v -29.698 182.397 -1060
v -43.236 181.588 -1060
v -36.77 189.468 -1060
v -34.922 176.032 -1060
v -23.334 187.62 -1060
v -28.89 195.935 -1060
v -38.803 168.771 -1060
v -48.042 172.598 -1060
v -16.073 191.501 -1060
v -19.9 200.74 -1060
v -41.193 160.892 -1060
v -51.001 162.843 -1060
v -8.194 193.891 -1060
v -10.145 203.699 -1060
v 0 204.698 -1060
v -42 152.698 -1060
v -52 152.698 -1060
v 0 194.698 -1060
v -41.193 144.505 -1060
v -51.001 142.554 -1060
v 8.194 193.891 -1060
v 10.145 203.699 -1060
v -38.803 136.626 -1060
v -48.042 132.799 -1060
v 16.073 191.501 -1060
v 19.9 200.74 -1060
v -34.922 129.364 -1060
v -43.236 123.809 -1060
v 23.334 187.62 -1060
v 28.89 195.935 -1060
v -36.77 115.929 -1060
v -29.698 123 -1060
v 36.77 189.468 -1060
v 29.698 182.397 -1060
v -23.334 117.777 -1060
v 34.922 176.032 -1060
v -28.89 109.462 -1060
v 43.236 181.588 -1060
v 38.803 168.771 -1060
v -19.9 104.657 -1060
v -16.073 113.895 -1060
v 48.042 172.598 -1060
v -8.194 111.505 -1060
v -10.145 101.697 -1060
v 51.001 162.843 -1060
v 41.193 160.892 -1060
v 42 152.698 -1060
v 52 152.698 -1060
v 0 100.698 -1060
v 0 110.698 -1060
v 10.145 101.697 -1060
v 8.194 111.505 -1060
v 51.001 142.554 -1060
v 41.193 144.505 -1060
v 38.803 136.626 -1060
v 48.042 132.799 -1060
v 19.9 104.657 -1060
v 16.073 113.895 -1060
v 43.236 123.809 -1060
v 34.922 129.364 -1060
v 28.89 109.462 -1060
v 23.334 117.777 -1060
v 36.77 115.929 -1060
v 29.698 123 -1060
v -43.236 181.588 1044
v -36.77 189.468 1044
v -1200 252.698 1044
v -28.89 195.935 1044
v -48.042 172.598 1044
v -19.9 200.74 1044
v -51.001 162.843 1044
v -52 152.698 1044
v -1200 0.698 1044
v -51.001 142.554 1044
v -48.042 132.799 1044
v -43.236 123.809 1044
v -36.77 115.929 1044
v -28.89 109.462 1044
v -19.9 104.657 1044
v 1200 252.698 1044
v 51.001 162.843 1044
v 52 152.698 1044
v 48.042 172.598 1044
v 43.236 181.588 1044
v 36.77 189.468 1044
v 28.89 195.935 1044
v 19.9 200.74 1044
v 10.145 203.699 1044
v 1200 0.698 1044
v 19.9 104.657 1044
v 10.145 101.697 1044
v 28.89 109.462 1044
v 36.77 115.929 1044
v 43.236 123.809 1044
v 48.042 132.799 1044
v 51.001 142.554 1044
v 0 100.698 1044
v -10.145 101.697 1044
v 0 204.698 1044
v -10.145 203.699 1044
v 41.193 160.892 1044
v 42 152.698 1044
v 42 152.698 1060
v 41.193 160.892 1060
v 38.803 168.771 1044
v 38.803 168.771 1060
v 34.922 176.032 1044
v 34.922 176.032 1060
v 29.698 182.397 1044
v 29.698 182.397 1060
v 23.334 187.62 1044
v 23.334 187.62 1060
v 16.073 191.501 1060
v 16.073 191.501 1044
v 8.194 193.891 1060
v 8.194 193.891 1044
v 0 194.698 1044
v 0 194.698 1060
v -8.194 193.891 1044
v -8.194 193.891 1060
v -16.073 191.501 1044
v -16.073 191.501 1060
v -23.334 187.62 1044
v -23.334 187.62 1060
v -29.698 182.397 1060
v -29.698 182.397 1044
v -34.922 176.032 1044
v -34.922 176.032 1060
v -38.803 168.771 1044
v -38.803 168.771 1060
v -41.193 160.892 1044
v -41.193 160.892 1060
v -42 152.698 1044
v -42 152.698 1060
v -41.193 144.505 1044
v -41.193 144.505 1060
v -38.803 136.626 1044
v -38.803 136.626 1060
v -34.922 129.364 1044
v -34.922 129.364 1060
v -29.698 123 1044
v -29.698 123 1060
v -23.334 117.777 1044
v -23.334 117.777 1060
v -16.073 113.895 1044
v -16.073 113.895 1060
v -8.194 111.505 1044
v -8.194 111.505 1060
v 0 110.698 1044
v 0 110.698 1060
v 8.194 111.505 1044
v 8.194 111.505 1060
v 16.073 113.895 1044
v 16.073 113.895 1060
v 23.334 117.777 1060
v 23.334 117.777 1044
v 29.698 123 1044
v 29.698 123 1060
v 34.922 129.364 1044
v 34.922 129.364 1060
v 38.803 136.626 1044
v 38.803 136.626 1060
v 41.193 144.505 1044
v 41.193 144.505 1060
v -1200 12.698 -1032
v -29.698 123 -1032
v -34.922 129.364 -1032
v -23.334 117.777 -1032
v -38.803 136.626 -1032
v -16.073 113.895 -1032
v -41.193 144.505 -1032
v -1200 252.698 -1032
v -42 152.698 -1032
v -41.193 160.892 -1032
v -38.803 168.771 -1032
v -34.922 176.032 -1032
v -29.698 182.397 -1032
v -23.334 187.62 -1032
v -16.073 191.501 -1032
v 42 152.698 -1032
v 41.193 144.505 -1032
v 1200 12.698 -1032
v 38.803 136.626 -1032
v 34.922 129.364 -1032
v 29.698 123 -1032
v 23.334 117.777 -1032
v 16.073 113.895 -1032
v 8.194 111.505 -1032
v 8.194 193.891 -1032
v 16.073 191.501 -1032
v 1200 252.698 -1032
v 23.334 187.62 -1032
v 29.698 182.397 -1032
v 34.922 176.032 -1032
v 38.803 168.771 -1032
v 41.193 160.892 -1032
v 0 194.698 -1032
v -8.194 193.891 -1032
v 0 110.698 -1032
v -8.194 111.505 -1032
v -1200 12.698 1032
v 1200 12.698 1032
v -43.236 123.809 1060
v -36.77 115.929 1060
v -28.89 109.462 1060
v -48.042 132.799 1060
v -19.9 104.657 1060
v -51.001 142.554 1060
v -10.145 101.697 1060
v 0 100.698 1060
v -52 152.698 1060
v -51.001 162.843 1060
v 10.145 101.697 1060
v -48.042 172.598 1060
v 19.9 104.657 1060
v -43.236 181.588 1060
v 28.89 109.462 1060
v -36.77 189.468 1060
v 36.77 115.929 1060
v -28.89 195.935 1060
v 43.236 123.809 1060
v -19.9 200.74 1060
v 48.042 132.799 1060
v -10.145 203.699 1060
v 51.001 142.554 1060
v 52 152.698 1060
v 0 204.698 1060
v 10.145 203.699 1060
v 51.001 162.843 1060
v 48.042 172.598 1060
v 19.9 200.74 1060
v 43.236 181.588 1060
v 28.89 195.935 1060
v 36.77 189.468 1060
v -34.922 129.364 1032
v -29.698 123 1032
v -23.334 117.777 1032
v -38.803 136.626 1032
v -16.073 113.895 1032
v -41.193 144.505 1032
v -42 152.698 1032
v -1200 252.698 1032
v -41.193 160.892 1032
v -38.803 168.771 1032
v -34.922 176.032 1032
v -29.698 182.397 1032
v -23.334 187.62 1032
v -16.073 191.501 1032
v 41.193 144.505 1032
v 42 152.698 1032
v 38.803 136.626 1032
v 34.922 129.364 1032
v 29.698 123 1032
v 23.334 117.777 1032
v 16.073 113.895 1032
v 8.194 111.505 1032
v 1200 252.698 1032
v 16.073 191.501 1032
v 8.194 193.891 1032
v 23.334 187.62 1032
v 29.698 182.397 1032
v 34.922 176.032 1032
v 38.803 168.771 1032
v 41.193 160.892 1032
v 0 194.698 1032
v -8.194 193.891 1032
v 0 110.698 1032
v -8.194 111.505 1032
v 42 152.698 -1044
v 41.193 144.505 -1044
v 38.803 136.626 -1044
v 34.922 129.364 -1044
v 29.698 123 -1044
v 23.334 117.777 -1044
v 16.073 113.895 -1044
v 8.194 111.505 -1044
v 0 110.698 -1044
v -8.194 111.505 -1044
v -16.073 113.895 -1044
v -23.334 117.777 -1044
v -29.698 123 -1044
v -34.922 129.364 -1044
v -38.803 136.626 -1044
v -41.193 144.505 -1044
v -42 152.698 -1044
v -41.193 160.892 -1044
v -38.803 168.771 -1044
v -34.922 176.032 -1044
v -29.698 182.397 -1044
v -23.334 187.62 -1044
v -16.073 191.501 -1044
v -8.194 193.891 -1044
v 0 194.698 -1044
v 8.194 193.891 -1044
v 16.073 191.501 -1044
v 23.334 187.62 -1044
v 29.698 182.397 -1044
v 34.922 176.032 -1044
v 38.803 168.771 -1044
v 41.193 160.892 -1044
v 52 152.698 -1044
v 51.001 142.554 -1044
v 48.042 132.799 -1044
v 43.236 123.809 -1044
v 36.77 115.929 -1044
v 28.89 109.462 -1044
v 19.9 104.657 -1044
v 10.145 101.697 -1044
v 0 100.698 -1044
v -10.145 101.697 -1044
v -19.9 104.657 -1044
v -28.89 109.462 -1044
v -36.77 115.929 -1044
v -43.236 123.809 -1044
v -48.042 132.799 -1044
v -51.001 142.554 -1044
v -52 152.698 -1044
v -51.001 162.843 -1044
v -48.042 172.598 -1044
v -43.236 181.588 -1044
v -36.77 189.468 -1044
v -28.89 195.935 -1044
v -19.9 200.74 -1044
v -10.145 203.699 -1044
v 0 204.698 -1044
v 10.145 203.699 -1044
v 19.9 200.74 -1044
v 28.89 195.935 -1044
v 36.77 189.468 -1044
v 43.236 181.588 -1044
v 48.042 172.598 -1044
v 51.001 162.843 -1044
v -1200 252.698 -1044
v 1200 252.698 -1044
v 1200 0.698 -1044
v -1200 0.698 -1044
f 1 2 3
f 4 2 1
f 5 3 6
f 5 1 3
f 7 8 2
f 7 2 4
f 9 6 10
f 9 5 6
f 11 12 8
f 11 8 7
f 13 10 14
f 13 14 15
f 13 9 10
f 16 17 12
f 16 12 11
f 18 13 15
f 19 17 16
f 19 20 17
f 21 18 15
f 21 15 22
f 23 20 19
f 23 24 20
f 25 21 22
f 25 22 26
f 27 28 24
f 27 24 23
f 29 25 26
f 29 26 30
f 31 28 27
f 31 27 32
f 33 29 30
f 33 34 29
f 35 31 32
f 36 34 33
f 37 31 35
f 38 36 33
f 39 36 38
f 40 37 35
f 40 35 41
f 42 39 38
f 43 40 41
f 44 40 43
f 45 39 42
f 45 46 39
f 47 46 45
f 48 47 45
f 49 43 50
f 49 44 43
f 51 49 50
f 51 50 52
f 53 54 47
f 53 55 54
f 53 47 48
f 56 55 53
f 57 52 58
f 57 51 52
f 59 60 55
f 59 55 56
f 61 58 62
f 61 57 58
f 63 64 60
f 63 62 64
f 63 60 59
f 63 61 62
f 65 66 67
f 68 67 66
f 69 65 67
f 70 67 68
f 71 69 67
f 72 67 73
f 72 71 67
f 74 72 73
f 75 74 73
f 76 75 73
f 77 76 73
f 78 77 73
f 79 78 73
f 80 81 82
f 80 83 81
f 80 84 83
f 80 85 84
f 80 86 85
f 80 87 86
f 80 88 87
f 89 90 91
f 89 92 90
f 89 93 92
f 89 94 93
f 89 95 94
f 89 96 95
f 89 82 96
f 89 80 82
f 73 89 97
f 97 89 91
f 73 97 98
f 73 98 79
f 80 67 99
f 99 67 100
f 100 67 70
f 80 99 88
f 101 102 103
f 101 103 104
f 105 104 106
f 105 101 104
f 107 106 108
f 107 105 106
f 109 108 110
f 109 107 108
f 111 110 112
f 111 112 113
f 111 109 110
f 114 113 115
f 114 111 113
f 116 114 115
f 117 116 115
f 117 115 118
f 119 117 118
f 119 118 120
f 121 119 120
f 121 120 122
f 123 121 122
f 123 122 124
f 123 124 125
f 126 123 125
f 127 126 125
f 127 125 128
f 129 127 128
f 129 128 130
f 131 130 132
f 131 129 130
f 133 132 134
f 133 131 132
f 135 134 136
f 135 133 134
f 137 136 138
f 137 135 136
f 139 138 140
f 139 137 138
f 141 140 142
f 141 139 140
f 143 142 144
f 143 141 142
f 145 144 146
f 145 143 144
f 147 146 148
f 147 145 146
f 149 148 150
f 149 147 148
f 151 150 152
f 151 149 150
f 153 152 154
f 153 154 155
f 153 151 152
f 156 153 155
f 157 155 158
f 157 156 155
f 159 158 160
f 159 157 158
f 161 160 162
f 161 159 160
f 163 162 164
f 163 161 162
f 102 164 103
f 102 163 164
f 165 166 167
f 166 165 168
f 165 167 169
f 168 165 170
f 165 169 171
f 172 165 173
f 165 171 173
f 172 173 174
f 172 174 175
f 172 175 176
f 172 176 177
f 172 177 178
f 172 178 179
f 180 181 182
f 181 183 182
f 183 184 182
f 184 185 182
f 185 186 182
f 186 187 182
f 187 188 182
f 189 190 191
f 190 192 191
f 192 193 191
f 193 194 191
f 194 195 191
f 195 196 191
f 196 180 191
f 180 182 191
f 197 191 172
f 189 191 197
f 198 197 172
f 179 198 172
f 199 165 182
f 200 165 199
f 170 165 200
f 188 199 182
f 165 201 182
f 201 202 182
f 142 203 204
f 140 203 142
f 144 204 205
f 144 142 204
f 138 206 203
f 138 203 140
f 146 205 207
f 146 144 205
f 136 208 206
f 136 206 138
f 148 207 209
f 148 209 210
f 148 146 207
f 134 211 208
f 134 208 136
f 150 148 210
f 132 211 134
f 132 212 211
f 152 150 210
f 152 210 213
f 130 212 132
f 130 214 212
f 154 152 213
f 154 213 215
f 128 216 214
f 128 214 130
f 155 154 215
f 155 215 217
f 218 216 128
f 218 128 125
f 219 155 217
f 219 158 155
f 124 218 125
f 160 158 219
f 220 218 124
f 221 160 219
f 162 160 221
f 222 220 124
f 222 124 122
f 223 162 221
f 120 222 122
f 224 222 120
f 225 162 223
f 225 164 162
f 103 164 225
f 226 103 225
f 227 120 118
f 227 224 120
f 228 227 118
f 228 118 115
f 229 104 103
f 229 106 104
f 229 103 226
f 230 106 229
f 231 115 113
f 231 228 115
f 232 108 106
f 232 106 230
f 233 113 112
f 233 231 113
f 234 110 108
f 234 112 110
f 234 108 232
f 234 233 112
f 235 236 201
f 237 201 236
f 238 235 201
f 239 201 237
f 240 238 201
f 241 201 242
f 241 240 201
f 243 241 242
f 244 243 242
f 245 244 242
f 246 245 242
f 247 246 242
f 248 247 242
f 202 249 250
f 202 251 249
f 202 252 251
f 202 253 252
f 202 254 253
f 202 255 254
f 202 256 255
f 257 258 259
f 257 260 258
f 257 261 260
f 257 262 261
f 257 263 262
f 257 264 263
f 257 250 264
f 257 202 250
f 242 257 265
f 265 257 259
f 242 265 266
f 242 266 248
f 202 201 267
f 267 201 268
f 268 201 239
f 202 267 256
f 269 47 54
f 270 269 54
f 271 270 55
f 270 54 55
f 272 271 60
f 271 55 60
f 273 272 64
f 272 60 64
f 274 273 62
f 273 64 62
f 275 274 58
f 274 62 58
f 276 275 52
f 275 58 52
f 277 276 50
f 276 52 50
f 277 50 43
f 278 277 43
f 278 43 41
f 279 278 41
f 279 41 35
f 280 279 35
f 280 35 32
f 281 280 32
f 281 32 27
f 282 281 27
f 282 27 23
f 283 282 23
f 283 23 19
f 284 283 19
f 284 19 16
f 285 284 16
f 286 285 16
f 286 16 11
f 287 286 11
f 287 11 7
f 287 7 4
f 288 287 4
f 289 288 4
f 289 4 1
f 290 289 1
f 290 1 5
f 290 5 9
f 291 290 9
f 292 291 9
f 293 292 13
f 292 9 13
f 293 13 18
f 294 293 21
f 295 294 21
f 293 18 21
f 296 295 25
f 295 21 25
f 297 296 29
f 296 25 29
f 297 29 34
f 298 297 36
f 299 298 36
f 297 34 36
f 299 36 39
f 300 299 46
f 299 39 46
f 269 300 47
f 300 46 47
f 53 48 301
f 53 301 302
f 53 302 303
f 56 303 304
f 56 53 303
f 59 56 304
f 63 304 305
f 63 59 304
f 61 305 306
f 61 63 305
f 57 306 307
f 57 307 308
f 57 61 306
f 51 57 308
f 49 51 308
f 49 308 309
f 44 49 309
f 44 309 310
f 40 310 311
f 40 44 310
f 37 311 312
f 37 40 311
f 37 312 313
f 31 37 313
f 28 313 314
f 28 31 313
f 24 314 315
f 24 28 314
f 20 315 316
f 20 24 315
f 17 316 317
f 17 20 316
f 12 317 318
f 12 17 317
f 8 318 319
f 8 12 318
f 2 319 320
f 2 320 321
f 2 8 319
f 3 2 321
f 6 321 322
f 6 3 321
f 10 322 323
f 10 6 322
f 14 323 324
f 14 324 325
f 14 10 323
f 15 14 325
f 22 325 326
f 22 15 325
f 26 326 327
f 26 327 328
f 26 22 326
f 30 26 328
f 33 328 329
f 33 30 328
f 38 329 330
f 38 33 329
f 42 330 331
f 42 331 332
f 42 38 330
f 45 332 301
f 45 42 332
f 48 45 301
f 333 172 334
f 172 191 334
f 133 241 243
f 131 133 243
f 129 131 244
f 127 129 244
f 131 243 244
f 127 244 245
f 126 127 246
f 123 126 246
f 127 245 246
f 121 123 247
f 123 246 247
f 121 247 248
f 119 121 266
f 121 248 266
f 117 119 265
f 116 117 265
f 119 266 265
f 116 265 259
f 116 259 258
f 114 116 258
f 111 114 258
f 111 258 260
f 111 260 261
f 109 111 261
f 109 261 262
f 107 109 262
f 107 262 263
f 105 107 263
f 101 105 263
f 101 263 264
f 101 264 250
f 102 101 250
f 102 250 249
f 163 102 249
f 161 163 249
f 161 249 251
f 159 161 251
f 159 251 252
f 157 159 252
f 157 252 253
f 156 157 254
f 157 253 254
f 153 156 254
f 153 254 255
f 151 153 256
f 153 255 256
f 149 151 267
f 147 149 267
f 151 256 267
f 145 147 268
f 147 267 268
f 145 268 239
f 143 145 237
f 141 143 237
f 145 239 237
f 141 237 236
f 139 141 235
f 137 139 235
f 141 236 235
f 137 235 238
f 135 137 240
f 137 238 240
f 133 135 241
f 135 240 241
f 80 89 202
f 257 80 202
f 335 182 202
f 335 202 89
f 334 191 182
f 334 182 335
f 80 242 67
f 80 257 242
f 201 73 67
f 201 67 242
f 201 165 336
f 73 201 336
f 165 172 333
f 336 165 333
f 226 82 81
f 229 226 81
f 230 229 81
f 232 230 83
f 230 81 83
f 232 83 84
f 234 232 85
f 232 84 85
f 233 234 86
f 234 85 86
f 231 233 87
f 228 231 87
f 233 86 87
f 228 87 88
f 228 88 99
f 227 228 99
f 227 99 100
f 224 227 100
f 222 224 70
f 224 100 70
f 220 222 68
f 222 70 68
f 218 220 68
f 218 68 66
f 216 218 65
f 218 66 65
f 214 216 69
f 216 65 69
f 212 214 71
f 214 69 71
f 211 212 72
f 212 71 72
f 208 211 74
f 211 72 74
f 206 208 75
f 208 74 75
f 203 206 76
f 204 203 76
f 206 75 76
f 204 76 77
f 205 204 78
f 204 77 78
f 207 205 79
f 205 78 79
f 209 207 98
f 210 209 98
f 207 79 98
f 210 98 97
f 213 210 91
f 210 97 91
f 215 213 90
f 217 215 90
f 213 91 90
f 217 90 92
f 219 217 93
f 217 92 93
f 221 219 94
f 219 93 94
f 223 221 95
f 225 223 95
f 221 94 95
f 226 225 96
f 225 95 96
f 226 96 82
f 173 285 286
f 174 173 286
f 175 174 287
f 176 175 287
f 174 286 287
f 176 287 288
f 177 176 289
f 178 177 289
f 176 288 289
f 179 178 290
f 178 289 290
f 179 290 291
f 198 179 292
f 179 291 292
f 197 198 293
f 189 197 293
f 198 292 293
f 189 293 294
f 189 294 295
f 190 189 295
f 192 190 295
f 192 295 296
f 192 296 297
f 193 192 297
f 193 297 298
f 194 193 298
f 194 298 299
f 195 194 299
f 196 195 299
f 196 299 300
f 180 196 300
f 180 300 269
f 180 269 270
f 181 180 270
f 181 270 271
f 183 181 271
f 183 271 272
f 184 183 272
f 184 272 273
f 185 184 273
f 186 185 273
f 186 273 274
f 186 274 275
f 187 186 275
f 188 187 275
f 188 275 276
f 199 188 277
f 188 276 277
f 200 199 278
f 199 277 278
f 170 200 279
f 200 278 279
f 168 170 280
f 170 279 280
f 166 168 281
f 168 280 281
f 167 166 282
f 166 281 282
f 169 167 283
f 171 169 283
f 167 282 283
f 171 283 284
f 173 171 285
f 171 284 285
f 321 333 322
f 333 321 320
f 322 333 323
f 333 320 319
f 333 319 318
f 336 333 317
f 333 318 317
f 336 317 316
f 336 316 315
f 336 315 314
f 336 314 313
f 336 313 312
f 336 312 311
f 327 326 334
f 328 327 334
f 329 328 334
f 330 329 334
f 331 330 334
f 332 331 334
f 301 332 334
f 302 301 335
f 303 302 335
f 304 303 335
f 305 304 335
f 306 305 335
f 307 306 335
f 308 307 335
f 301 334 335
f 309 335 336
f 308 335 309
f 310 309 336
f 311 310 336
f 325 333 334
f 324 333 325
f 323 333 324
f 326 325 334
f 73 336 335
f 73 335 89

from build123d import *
from build123d.topology import SkipClean

# Parameters (mm, degrees)
VYSUNOUT_TENKOST_NN_1_DEPTH = 150
SKICA9_R                    = 5.25
ODEBRAT_VYSUNUT_M4_DEPTH    = 307.569731056
SKETCH1_R                   = 6.5
SKETCH1_R_2                 = 5.25
BOSS_EXTRUDE2_DEPTH         = 2
BOSS_EXTRUDE3_START         = 2
SKETCH2_R                   = 6.5
SKETCH2_R_2                 = 5.25
BOSS_EXTRUDE3_DEPTH         = 2
SCALE1_SCALE                = 8


with BuildPart() as part:
    # Skica4 → Vysunout tenkostěnný1 (new, symmetric)
    with BuildSketch(Plane(origin=(0, 0, 0), x_dir=(0, 0, -1), z_dir=(1, 0, 0))):
        Polygon((0, 28), (100, 28), (129, 28), (129, 58), (130.5, 58), (130.5, 26.5), (100, 26.5), (0, 26.5), align=None)
    vysunout_tenkost_nn_1 = extrude(amount=VYSUNOUT_TENKOST_NN_1_DEPTH, both=True)

    # Zrcadlit1: Vysunout tenkostěnný1 across plane
    add(vysunout_tenkost_nn_1.mirror(Plane(origin=(150, 26.5, 0), x_dir=(1, 0, 0), z_dir=(0, 0, 1))))

    # Skica9 → Odebrat vysunutím4 (cut, through all)
    with BuildSketch(Plane(origin=(0, 0, -130.5), x_dir=(-1, 0, 0), z_dir=(0, 0, -1))):
        with Locations((0, 45.5)):
            Circle(SKICA9_R)
    extrude(amount=-ODEBRAT_VYSUNUT_M4_DEPTH, mode=Mode.SUBTRACT)

    # Sketch1 → Boss-Extrude2 (add)
    with SkipClean():  # the faces are left unmerged after this step: merging them gives an invalid solid
        with BuildSketch(Plane.XY.offset(130.5)):
            with Locations((0, 45.5)):
                Circle(SKETCH1_R)
            with Locations((0, 45.5)):
                Circle(SKETCH1_R_2, mode=Mode.SUBTRACT)
        extrude(amount=BOSS_EXTRUDE2_DEPTH)

    # Sketch2 → Boss-Extrude3 (add)
    with BuildSketch(Plane(origin=(0, 0, -130.5), x_dir=(-1, 0, 0), z_dir=(0, 0, -1)).offset(BOSS_EXTRUDE3_START)):
        with Locations(Location((0, 45.5, 0), (0, 0, 180))):
            Circle(SKETCH2_R)
        with Locations(Location((0, 45.5, 0), (0, 0, 180))):
            Circle(SKETCH2_R_2, mode=Mode.SUBTRACT)
    extrude(amount=-BOSS_EXTRUDE3_DEPTH)


with BuildPart() as part_1:
    # Scale1: scaled about (0, 30.185952613, 0)
    add(part.part.scale(SCALE1_SCALE).moved(Location((0, -211.301668291, 0))))


solid = part_1.part
